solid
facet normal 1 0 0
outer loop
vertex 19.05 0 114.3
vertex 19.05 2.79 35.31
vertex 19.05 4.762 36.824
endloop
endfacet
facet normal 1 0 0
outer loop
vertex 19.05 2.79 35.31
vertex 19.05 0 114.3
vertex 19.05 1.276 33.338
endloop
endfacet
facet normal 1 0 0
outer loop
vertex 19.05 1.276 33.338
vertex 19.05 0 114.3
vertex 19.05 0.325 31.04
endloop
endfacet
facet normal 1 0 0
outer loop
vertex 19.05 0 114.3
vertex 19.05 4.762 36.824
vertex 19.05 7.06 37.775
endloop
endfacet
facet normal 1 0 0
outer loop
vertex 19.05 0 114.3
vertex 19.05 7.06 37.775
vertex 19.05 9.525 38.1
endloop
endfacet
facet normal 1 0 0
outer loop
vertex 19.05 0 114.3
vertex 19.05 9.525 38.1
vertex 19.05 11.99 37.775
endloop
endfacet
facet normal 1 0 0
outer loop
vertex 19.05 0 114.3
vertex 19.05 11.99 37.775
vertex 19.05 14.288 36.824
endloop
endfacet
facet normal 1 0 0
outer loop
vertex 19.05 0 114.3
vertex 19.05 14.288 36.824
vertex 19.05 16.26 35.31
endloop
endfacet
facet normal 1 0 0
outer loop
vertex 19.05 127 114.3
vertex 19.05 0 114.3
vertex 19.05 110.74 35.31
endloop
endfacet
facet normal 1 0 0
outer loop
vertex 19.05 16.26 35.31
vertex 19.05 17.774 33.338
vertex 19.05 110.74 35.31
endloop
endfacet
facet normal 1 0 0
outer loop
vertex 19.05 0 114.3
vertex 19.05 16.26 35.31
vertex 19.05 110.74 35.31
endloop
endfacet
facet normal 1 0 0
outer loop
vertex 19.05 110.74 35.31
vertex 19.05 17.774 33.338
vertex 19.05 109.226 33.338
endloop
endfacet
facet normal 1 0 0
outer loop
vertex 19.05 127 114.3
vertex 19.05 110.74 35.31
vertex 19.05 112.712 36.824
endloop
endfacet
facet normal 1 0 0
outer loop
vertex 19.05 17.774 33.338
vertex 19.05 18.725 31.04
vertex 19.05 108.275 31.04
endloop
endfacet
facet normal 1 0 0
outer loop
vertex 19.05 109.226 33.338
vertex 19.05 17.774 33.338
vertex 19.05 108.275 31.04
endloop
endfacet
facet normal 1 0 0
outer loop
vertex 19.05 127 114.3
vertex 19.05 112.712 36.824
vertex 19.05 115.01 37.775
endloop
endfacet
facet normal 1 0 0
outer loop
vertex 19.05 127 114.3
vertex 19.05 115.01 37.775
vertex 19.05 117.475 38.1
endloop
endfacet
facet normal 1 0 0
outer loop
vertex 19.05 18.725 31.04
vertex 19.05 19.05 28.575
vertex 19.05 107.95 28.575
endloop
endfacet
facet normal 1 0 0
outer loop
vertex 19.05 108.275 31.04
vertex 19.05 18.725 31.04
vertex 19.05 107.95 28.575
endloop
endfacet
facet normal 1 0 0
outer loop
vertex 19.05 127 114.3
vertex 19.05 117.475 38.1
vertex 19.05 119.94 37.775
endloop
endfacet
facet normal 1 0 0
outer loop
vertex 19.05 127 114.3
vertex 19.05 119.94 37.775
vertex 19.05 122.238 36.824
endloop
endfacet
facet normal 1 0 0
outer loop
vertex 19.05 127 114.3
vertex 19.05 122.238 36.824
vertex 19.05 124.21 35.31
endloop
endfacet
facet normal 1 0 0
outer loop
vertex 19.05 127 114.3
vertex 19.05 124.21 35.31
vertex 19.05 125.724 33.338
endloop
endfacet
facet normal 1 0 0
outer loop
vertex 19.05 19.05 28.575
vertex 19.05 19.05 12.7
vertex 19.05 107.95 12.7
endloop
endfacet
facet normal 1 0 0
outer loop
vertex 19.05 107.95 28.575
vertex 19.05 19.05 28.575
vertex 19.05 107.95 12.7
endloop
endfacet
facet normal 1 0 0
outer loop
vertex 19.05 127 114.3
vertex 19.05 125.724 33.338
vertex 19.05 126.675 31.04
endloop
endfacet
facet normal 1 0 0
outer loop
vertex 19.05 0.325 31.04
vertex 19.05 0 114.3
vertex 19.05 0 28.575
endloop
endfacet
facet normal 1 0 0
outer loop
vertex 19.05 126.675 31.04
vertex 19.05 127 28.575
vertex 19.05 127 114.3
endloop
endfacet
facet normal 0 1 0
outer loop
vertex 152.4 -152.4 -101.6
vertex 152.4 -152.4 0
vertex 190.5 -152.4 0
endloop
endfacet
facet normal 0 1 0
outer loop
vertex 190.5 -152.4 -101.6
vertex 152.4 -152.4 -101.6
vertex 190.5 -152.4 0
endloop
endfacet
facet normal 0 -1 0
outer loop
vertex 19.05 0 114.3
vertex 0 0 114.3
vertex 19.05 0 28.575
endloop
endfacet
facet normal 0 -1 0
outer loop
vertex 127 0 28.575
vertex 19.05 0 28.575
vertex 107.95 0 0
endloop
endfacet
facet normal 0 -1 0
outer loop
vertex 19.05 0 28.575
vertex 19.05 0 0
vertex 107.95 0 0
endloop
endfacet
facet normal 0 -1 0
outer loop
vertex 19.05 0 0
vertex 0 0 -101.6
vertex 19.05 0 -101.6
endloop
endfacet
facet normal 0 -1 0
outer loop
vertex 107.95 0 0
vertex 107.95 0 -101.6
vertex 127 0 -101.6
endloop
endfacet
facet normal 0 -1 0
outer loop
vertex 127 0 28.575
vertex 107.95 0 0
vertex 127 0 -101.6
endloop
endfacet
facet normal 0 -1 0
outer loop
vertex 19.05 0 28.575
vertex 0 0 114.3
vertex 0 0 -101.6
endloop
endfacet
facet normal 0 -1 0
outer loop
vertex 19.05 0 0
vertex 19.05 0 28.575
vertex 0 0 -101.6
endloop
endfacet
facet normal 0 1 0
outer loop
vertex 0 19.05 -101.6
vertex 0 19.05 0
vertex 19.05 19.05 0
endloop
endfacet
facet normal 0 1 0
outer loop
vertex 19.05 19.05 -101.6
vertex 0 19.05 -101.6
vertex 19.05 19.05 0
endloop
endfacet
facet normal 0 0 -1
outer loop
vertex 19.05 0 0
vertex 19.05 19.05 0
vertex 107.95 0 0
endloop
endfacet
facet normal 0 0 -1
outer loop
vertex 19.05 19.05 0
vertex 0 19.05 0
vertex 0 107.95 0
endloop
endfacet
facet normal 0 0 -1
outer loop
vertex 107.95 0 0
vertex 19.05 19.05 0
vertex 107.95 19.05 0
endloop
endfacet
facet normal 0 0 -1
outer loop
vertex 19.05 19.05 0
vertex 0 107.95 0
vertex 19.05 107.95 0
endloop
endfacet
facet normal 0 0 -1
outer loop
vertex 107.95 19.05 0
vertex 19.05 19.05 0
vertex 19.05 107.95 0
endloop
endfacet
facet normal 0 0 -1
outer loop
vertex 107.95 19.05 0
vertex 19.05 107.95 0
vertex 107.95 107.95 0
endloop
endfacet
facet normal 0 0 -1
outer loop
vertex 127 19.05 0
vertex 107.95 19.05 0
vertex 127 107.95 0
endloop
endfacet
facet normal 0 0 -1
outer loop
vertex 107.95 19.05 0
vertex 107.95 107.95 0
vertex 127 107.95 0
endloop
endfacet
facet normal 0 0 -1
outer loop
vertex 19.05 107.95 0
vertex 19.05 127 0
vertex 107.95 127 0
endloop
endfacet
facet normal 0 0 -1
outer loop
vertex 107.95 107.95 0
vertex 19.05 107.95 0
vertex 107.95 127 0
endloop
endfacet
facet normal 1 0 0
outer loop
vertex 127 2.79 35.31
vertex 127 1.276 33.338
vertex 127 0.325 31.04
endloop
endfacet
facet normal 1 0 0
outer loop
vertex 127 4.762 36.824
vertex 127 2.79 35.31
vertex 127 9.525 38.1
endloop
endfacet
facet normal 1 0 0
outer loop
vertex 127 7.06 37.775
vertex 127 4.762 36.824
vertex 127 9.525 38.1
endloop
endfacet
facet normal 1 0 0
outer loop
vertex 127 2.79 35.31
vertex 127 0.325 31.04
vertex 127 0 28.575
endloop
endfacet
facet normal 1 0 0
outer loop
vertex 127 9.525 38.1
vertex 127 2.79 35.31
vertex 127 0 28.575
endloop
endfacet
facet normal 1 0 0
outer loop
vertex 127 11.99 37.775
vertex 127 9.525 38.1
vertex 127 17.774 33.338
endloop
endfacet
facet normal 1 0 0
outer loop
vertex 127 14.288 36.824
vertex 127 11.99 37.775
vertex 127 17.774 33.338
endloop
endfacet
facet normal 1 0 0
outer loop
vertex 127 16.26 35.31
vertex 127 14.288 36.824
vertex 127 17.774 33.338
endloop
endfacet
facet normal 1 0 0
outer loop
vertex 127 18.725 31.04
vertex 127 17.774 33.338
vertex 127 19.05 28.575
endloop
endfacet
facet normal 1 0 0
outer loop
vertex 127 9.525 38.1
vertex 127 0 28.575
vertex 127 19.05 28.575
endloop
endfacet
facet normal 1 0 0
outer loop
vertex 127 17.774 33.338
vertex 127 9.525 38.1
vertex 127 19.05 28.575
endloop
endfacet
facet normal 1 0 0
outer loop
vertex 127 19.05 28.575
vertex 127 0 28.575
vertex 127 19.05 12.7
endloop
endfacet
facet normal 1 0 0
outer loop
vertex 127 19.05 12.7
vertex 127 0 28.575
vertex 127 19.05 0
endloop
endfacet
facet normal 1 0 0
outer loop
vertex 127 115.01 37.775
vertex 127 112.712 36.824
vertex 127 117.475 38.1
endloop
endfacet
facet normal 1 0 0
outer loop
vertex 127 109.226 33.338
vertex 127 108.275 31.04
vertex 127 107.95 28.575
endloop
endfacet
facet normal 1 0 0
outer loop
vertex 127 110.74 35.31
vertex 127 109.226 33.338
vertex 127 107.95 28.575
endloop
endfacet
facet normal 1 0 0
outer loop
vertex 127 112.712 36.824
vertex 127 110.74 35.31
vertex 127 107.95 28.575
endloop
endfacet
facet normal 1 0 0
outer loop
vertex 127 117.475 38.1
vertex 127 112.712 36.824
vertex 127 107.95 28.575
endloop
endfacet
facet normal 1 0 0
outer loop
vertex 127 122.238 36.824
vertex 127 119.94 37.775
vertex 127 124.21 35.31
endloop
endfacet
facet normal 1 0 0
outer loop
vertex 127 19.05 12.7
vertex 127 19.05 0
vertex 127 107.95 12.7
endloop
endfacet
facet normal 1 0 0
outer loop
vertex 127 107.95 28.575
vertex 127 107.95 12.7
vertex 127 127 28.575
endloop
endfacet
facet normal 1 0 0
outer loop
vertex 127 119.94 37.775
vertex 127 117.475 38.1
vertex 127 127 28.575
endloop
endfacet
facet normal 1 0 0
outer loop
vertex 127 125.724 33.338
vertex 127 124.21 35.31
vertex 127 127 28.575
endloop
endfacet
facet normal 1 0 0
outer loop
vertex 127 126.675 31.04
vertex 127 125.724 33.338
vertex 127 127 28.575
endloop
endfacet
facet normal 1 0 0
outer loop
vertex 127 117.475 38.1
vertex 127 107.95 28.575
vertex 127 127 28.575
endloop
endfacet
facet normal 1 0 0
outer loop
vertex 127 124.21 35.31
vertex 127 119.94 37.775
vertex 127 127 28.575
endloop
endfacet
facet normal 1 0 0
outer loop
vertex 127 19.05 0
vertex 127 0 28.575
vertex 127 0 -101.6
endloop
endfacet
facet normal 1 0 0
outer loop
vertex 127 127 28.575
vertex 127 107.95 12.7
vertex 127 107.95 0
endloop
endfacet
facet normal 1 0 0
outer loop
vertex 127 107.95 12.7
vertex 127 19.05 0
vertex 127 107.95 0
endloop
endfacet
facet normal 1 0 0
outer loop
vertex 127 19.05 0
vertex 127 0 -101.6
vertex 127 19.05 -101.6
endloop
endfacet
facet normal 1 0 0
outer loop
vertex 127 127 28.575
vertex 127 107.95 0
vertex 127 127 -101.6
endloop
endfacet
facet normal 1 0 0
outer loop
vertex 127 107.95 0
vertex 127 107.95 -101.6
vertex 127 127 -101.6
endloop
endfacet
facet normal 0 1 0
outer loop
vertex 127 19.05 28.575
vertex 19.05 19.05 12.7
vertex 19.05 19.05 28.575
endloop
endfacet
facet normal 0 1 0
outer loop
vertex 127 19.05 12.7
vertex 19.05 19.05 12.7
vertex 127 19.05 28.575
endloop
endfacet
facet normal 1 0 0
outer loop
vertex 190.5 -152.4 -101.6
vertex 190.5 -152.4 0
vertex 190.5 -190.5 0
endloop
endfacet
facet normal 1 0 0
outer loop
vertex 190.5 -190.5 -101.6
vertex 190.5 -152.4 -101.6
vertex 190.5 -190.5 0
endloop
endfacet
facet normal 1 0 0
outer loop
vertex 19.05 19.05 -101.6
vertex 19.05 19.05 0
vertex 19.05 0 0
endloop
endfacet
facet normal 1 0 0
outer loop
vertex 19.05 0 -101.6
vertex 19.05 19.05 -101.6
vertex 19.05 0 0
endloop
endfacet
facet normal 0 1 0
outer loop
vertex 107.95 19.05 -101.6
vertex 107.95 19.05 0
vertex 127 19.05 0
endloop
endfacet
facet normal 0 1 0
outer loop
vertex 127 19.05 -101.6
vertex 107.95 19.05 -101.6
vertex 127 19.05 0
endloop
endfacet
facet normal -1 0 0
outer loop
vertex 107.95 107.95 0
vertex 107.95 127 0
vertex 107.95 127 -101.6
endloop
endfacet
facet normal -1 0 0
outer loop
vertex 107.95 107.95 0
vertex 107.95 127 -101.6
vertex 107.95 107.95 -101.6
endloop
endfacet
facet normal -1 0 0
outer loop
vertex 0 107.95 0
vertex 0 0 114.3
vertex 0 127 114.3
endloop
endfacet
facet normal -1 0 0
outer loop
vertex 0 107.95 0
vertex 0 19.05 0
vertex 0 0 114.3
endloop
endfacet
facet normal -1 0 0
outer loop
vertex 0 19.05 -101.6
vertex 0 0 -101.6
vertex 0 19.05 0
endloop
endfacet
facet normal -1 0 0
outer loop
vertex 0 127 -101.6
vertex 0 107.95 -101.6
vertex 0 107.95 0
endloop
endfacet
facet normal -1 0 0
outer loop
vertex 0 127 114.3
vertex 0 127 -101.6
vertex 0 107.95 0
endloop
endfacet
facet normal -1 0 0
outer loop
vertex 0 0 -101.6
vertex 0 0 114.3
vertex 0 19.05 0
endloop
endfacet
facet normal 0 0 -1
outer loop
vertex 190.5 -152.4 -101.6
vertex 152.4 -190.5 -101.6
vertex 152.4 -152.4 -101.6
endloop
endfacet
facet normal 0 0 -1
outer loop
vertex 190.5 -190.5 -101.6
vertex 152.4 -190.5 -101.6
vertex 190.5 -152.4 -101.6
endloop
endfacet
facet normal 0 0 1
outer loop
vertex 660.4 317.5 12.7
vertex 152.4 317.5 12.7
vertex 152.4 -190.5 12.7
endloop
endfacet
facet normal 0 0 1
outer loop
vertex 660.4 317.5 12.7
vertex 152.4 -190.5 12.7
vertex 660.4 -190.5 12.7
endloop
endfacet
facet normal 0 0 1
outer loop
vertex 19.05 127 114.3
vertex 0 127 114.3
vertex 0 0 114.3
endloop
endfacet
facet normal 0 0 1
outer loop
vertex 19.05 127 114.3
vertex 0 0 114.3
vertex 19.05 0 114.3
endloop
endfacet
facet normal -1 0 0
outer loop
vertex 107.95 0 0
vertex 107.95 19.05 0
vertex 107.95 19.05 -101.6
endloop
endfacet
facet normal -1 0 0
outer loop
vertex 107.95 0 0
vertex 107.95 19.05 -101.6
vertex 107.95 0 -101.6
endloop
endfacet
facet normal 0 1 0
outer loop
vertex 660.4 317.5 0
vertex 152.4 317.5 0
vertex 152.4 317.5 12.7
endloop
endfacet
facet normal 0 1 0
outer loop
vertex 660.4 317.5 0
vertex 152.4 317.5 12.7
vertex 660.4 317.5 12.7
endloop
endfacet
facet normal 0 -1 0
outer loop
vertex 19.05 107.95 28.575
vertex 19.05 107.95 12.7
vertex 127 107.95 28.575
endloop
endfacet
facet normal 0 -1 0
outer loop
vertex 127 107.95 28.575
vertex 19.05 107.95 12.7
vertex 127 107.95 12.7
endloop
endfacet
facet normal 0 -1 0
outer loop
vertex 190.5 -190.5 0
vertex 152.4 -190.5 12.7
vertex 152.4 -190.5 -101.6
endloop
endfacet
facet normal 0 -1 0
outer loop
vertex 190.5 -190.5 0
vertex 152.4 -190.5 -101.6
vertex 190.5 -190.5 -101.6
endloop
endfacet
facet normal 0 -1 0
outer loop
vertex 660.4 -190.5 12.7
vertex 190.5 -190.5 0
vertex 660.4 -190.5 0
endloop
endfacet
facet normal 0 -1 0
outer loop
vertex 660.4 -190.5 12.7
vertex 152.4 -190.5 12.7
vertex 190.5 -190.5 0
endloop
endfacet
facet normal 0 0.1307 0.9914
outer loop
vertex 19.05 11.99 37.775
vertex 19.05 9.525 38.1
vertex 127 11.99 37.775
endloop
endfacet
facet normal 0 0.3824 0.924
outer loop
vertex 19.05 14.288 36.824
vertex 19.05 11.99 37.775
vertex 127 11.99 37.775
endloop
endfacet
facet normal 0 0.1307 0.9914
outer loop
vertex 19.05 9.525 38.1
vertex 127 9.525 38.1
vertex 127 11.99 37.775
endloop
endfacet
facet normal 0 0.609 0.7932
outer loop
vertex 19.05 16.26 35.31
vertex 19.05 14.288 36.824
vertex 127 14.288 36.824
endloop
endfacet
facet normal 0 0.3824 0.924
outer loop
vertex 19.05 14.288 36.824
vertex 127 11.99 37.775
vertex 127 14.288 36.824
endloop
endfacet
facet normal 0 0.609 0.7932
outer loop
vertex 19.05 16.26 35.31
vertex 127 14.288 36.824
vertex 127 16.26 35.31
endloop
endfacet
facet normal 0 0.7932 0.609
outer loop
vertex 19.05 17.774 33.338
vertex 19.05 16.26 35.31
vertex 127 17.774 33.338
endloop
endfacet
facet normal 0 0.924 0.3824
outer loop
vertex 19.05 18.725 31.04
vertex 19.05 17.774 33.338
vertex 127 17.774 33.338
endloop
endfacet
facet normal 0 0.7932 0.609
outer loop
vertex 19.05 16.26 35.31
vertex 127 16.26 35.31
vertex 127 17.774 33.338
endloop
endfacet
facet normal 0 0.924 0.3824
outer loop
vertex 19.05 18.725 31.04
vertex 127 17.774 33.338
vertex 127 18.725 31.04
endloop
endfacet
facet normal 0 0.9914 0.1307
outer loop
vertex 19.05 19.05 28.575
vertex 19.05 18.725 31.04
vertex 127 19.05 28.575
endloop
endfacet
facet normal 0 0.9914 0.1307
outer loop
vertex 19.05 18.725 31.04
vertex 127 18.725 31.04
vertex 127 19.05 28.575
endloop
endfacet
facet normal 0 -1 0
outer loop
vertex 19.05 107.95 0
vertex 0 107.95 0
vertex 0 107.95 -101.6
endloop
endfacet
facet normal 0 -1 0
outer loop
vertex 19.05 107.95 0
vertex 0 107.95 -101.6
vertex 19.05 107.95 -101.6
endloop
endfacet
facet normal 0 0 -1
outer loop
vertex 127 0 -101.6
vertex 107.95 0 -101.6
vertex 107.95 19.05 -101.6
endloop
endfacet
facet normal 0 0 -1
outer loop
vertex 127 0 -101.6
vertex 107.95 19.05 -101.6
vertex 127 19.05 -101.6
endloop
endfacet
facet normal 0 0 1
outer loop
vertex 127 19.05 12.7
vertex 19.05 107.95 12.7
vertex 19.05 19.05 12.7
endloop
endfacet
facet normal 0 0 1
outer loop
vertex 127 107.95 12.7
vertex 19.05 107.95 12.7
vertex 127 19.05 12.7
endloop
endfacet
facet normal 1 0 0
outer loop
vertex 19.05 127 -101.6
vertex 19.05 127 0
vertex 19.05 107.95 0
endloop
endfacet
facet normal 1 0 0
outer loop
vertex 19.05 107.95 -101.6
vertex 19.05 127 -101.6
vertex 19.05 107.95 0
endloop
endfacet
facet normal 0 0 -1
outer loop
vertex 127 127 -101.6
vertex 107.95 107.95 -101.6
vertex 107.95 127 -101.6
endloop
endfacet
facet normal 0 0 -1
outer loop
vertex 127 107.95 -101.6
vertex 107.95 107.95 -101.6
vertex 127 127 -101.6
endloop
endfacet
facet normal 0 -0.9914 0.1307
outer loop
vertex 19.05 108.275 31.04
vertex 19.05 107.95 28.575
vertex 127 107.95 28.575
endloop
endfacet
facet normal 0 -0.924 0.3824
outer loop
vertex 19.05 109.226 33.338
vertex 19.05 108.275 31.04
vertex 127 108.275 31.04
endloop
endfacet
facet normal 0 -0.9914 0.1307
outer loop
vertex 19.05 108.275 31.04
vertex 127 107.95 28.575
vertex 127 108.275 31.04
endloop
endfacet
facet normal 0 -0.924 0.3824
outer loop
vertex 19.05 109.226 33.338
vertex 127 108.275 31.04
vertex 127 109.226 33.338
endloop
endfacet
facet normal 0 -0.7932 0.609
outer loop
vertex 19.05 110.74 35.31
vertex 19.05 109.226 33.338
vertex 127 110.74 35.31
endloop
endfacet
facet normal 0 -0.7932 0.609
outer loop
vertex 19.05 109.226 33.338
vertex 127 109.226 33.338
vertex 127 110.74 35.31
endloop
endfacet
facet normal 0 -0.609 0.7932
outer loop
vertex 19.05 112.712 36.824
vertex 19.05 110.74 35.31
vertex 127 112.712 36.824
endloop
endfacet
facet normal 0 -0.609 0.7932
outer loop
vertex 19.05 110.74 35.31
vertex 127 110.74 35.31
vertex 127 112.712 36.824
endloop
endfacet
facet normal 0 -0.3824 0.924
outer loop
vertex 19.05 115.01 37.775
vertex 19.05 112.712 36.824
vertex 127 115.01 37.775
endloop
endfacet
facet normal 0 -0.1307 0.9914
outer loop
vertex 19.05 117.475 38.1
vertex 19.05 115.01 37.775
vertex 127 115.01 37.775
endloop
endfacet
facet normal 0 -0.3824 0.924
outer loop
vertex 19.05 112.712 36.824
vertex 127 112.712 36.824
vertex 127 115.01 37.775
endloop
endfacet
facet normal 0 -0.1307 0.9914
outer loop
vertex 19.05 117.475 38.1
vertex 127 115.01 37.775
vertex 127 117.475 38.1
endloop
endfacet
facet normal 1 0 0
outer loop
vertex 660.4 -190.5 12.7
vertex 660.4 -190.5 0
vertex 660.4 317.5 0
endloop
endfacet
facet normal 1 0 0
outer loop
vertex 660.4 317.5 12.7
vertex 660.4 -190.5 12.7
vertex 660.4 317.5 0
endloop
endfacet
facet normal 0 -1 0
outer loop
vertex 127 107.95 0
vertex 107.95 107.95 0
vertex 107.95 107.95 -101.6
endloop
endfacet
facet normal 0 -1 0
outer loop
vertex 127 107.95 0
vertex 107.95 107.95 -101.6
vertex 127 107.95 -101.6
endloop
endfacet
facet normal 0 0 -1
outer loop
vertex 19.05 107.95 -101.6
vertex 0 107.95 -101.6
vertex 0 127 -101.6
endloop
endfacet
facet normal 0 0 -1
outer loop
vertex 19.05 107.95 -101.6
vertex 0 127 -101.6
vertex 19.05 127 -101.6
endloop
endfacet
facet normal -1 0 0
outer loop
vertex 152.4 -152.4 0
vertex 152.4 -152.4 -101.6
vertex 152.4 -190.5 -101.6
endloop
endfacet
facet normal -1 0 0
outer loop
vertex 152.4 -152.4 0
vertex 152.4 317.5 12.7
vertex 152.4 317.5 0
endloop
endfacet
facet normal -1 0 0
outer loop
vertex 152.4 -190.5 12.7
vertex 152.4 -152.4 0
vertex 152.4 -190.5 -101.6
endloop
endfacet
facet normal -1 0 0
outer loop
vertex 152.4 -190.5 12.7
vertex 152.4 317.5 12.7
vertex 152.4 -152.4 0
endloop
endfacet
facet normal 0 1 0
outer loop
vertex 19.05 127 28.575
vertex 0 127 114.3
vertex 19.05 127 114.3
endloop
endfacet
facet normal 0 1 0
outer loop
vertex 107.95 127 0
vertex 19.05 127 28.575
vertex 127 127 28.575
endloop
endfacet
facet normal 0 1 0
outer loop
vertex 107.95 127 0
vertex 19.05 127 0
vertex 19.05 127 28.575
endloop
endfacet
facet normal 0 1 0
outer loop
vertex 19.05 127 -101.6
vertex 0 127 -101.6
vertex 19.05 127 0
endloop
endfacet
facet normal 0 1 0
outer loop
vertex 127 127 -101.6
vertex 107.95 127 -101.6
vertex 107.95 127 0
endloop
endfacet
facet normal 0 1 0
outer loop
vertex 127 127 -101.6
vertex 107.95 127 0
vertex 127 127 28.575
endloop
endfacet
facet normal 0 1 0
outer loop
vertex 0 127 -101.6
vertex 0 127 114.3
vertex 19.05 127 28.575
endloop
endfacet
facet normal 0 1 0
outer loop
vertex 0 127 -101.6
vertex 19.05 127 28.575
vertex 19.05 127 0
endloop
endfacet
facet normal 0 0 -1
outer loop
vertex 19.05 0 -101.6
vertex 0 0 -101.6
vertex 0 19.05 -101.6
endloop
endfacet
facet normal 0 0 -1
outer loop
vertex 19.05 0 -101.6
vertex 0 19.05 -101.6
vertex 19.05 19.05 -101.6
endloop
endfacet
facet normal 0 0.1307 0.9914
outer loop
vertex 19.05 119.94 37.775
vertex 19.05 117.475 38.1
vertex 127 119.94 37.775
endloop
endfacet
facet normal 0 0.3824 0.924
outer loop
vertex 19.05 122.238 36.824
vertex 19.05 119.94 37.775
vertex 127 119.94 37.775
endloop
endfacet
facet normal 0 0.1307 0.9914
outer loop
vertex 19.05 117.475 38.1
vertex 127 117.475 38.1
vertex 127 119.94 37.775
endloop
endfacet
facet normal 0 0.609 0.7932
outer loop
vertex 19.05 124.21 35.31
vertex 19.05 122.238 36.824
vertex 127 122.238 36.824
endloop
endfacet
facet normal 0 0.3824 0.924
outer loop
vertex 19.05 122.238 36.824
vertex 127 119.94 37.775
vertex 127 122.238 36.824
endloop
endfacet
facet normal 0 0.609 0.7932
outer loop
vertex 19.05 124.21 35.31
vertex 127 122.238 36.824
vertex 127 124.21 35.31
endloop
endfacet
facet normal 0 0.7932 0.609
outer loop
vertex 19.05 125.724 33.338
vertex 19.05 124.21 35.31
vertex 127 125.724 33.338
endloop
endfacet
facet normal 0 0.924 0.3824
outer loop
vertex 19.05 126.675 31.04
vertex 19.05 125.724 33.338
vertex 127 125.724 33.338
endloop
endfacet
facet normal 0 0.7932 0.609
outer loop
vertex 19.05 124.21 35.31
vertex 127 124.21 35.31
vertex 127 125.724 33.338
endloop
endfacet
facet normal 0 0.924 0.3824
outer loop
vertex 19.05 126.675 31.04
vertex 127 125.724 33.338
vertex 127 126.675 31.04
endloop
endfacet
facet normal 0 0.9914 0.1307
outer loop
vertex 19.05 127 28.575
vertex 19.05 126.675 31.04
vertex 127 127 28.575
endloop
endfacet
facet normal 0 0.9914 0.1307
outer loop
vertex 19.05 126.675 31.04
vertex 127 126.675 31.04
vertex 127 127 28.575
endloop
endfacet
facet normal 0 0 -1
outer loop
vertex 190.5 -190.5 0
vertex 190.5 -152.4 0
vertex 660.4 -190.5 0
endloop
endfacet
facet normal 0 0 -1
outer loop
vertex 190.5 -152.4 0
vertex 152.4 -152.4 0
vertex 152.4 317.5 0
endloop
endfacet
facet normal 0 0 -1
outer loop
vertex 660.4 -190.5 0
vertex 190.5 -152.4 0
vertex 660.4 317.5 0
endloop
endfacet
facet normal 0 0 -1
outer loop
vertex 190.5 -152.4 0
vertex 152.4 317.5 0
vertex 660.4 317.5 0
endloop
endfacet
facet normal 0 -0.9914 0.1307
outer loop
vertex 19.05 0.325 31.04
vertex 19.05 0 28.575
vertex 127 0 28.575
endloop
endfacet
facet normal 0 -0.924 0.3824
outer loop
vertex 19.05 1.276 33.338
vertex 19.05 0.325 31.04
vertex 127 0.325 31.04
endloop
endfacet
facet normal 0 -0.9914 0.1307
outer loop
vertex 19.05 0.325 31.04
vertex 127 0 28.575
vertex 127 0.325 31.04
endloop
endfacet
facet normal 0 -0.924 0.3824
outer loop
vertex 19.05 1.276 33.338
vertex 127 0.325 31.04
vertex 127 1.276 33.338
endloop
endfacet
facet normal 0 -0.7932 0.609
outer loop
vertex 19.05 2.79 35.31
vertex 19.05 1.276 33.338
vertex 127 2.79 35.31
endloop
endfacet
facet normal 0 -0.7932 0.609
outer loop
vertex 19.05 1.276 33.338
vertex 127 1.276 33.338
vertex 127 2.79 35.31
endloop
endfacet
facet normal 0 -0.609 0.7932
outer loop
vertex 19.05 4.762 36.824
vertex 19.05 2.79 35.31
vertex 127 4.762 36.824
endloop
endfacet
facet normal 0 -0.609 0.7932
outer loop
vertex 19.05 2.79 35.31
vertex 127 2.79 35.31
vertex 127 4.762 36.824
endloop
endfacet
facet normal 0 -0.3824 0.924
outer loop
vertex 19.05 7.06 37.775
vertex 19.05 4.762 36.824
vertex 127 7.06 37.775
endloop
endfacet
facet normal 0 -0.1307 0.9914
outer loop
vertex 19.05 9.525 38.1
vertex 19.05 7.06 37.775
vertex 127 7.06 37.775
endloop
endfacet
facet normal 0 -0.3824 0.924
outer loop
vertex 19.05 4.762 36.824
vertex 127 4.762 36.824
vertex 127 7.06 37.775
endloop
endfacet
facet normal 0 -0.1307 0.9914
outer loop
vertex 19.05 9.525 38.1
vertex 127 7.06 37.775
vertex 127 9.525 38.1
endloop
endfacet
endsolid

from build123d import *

# Parameters (mm, degrees)
F0_W      = 127
F0_H      = 127
F1_DEPTH  = 12.7
F2_W      = 19.05
F2_H      = 19.05
F3_DEPTH  = 101.6
F4_W      = 19.05
F4_H      = 127
F5_DEPTH  = 101.6
F6_W      = 107.95
F6_H      = 19.05
F7_DEPTH  = 25.4
F8_R      = 9.52499
F9_W      = 508
F9_H      = 508
F10_DEPTH = 12.7
F11_W     = 38.1
F11_H     = 38.1
F12_DEPTH = 101.6


# Not quite as in the source:
# - a fillet or chamfer is up to 0.001 mm smaller than in the source, because OpenCascade refuses the exact size


with BuildPart() as f1:
    # F0 (on Top) → F1 (new body)
    with BuildSketch(Plane.XY):
        with Locations((63.5, 63.5)):
            Rectangle(F0_W, F0_H)
    extrude(amount=F1_DEPTH)

    # F2 (on face) → F3 (join)
    with BuildSketch(Plane(origin=(0, 0, 0), x_dir=(1, 0, 0), z_dir=(0, 0, -1))):
        with Locations((9.525, -9.525)):
            Rectangle(F2_W, F2_H)
        with Locations((9.525, -117.475)):
            Rectangle(F2_W, F2_H)
        with Locations((117.475, -117.475)):
            Rectangle(F2_W, F2_H)
        with Locations((117.475, -9.525)):
            Rectangle(F2_W, F2_H)
    extrude(amount=F3_DEPTH)

    # F4 (on face) → F5 (join)
    with BuildSketch(Plane.XY.offset(12.7)):
        with Locations((9.525, 63.5)):
            Rectangle(F4_W, F4_H)
    extrude(amount=F5_DEPTH)

    # F6 (on face) → F7 (join)
    with BuildSketch(Plane.XY.offset(12.7)):
        with Locations((73.025, 9.525)):
            Rectangle(F6_W, F6_H)
        with Locations((73.025, 117.475)):
            Rectangle(F6_W, F6_H)
    extrude(amount=F7_DEPTH)

    # F8 (radius 9.525 in the source; OpenCascade refuses exactly that, so slightly less here)
    f8_edges = [f1.edges().sort_by_distance(p)[0] for p in [
        (73.025, 0, 38.1),
        (73.025, 19.05, 38.1),
        (73.025, 127, 38.1),
        (73.025, 107.95, 38.1),
    ]]
    fillet(f8_edges, radius=F8_R)


with BuildPart() as f10:
    # F9 (on Top) → F10 (new body)
    with BuildSketch(Plane.XY):
        with Locations((406.4, 63.5)):
            Rectangle(F9_W, F9_H)
    extrude(amount=F10_DEPTH)

    # F11 (on face) → F12 (join, through all)
    with BuildSketch(Plane(origin=(0, 0, 0), x_dir=(1, 0, 0), z_dir=(0, 0, -1))):
        with Locations((171.45, 171.45)):
            Rectangle(F11_W, F11_H)
    extrude(amount=F12_DEPTH)


solid = Compound([f1.part, f10.part])
